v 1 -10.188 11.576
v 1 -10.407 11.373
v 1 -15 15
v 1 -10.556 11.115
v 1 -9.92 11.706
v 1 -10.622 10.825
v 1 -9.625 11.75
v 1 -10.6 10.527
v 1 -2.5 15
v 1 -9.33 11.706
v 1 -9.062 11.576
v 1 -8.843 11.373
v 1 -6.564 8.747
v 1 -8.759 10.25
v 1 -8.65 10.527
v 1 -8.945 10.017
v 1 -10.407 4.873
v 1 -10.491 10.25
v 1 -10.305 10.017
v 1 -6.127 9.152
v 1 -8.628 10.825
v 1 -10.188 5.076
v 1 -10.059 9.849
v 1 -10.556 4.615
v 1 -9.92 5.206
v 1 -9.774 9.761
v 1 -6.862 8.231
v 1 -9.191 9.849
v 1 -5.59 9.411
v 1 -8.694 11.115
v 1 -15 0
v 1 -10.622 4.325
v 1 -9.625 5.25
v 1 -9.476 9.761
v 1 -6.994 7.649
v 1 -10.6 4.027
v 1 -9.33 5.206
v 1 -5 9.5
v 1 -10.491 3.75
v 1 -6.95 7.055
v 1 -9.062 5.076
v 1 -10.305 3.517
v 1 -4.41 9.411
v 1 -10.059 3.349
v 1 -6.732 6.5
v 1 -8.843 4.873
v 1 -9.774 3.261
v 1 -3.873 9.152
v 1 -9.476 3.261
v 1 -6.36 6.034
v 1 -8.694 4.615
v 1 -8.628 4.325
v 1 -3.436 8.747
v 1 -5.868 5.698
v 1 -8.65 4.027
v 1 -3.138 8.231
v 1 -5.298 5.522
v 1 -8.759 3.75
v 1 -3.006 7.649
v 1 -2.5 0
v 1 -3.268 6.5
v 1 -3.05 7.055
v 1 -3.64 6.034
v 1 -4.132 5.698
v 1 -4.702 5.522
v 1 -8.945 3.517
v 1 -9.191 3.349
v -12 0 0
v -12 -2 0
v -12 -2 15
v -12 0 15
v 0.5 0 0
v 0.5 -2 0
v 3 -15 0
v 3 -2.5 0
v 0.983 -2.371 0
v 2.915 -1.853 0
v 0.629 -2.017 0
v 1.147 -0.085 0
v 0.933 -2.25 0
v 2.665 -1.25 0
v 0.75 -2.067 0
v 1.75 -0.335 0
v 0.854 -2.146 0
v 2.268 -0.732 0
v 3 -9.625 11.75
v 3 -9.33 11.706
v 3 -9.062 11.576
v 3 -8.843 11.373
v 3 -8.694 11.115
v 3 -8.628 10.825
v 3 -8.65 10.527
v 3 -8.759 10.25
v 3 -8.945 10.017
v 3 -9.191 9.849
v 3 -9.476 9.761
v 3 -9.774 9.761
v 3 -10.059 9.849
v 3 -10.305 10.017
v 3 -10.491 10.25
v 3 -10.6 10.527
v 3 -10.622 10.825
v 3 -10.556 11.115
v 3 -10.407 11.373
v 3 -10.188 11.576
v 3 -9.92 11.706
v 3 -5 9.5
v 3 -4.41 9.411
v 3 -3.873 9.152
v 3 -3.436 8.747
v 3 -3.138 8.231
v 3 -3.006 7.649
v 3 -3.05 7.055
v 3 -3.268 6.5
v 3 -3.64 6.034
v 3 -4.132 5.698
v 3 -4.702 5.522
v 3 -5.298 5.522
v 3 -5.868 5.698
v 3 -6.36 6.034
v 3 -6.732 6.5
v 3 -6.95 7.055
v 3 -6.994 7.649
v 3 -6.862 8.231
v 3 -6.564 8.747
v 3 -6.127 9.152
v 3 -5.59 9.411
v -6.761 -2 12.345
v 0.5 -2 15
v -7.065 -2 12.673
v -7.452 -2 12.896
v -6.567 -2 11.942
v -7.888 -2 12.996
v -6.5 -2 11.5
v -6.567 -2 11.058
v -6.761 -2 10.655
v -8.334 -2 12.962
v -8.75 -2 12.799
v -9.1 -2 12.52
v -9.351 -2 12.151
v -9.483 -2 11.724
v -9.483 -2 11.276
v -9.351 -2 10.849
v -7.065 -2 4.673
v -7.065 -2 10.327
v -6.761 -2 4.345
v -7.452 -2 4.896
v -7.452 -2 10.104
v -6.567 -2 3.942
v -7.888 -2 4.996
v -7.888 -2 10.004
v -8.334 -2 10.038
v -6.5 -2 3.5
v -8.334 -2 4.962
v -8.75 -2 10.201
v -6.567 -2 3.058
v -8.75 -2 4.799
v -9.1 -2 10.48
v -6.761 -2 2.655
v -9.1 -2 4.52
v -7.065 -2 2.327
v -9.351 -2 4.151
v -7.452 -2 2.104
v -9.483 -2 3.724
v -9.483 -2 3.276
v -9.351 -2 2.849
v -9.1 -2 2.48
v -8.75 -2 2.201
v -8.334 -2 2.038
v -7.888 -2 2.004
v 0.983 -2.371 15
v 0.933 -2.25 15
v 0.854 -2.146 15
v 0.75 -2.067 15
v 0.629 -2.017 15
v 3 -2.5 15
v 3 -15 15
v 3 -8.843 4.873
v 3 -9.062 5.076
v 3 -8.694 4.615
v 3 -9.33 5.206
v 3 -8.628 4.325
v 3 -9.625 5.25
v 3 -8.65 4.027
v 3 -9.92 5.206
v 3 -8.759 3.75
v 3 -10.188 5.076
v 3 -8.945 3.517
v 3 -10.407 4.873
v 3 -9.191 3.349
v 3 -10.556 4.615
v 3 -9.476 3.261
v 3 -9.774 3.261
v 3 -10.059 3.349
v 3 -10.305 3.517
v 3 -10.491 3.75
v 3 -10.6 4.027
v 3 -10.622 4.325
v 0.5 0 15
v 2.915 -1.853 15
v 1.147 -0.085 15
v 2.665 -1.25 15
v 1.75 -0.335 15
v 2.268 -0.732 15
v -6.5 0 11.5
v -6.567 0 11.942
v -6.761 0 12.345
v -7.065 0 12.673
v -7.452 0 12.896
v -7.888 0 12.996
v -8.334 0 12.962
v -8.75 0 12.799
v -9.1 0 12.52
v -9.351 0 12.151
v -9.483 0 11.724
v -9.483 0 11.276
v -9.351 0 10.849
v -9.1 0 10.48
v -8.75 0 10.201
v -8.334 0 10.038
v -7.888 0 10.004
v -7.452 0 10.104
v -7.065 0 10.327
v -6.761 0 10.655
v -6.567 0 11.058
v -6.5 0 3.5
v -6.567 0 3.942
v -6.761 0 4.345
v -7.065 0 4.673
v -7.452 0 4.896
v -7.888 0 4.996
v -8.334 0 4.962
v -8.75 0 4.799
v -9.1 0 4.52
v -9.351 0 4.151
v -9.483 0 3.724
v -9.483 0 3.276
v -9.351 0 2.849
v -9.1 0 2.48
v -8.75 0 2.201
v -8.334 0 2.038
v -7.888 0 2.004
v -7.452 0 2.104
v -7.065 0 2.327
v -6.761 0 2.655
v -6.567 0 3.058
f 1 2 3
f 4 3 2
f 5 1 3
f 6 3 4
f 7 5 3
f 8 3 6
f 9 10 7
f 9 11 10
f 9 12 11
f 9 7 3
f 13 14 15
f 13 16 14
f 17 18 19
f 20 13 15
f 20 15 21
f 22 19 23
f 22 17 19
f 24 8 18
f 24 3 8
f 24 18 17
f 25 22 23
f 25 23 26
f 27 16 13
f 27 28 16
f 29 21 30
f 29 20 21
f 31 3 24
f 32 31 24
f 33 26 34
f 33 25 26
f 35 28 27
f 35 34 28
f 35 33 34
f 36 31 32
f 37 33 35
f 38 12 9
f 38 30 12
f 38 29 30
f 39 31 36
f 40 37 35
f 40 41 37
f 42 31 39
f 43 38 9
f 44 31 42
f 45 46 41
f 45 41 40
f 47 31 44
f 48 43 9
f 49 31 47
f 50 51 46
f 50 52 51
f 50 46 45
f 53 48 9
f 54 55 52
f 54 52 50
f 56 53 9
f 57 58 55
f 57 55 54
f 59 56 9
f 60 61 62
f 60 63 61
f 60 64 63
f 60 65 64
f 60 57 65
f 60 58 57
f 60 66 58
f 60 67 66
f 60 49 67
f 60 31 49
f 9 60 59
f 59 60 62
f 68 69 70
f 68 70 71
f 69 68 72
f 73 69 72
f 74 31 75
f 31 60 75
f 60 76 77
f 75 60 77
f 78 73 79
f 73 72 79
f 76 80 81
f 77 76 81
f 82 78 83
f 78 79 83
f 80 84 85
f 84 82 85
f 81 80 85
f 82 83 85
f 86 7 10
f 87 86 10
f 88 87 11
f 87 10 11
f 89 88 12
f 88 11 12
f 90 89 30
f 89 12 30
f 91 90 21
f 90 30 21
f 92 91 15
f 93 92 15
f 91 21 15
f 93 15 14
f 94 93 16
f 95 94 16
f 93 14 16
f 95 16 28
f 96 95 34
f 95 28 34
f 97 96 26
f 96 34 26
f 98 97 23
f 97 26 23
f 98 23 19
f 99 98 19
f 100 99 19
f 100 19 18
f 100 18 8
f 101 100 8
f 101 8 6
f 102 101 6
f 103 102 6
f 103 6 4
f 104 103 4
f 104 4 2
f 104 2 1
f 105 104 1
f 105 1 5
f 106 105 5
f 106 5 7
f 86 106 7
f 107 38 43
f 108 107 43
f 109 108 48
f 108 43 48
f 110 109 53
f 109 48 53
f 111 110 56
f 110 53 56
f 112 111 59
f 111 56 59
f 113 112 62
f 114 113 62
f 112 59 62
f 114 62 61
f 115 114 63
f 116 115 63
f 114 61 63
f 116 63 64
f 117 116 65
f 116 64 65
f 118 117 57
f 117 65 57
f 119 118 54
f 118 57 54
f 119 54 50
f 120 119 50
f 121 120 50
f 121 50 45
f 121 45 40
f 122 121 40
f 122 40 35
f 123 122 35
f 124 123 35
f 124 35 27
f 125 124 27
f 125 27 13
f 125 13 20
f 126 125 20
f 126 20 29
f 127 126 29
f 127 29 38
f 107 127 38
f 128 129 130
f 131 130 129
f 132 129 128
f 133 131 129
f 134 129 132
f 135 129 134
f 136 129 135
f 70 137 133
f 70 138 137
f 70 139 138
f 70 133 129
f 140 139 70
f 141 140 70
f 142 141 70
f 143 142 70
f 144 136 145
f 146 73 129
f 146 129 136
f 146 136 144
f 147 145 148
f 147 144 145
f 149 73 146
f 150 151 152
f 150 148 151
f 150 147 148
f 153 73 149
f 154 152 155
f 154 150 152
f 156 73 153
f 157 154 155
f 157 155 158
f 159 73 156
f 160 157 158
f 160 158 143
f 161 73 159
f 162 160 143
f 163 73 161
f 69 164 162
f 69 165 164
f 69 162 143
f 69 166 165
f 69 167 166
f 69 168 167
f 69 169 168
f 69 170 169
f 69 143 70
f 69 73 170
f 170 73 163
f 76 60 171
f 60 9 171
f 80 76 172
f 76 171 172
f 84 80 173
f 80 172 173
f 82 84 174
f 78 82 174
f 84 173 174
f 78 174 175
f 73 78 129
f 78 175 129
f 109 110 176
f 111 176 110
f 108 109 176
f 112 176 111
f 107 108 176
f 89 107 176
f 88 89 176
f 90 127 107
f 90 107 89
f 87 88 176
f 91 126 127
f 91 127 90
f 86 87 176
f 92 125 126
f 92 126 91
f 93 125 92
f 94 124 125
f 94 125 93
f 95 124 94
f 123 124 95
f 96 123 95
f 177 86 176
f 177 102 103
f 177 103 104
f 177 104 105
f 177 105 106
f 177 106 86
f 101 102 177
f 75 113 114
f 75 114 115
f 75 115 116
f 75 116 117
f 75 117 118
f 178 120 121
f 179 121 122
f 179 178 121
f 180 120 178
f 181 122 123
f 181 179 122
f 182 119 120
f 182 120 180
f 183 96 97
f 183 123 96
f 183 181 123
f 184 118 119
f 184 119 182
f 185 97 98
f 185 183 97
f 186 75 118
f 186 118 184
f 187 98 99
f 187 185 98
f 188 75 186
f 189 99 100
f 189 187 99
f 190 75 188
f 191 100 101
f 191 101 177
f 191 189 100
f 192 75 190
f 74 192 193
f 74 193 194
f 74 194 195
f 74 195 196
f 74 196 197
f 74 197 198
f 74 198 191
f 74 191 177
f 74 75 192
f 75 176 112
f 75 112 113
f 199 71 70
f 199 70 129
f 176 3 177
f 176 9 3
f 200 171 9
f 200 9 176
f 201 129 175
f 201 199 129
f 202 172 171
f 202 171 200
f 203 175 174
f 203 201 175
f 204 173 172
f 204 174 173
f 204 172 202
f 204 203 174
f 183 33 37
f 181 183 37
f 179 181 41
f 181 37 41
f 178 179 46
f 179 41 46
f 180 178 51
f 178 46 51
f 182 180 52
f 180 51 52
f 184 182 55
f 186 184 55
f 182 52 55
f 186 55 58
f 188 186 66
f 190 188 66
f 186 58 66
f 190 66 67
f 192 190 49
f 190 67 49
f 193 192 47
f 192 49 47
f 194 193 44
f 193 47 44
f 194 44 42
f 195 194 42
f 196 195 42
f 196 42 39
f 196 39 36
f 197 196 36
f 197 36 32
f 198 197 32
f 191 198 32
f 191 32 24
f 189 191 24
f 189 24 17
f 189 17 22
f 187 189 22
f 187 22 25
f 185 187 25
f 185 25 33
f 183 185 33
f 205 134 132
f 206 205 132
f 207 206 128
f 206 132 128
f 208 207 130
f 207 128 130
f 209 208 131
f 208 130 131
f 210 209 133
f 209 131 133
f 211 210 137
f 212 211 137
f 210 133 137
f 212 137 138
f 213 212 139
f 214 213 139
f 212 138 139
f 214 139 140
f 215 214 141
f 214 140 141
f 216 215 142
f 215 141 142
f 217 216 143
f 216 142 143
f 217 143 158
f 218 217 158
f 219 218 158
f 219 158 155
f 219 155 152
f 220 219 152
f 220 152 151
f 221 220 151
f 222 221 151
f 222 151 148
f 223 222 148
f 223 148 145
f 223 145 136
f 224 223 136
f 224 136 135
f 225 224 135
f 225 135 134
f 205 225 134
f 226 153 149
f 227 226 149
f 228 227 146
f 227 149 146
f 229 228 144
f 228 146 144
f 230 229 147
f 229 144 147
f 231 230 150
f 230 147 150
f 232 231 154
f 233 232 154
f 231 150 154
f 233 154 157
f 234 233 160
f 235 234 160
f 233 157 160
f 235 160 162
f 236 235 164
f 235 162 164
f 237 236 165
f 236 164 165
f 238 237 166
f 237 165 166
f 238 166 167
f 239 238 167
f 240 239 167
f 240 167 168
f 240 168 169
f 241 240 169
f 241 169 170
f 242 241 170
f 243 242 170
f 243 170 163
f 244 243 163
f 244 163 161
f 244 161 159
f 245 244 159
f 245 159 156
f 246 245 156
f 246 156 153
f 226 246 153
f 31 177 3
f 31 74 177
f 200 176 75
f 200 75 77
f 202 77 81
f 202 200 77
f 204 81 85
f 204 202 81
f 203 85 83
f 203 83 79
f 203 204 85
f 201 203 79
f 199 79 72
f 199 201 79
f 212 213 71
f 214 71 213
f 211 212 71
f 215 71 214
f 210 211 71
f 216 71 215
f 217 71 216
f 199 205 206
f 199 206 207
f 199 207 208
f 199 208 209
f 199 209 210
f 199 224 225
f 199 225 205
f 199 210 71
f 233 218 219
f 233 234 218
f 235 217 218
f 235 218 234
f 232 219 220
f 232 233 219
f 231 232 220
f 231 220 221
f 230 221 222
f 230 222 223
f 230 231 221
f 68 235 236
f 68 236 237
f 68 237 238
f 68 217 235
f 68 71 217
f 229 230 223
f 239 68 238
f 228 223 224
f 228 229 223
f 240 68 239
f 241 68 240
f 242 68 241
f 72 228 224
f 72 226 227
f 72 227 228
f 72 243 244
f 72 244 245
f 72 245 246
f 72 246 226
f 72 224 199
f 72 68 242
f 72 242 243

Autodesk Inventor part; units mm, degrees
ref_plane "YZ Plane" through (0, 0, 0) normal (1, 0, 0) x (0, 1, 0)
ref_plane "XZ Plane" through (0, 0, 0) normal (0, 1, 0) x (-1, 0, 0)
ref_plane "XY Plane" through (0, 0, 0) normal (0, 0, 1) x (1, 0, 0)
sketch "Sketch1" plane through (0, 0, 0) normal (0, 0, 1) x (1, 0, 0)
  line L0 (3, 0) -> (3, -15)
  line L1 (3, -15) -> (1, -15)
  line L2 (1, -15) -> (1, -2)
  line L3 (1, -2) -> (-12, -2)
  line L4 (-12, -2) -> (-12, 0)
  line L5 (-12, 0) -> (3, 0)
  line L6 (-12, 0) -> (3, 0)
  dimension "d38" = 2
  dimension "d39" = 13
  dimension "d40" = 13
  dimension "d41" = 2
extrude "Extrusion3" add sketch "Sketch1" along normal blind 15
sketch "Sketch2" plane through (-12, -2, 0) normal (0, -1, 0) x (1, 0, 0)
  circle A0 centre (4, 3.5) radius 1.5
  line L0 (0, 15) -> (13, 15) projected
  line L1 (0, 0) -> (0, 15) projected
  line L2 (0, 0) -> (13, 0) projected
  circle A1 centre (4, 11.5) radius 1.5
  dimension "d45" = 3
  dimension "d47" = 4
  dimension "d48" = 3.5
  dimension "d49" = 3
  dimension "d50" = 4
  dimension "d51" = 3.5
extrude "Extrusion4" cut sketch "Sketch2" against normal blind 10
sketch "Sketch3" plane through (1, -15, 0) normal (-1, 0, 0) x (0, 0, 1)
  circle A0 centre (10.75, 5.375) radius 1
  circle A1 centre (4.25, 5.375) radius 1
  line L0 (0, 0) -> (15, 0) projected
  line L1 (15, 13) -> (15, 0) projected
  line L2 (0, 13) -> (0, 0) projected
  circle A2 centre (7.5, 10) radius 2
  dimension "d54" = 2
  dimension "d55" = 2
  dimension "d56" = 5.375
  dimension "d57" = 5.375
  dimension "d58" = 4.25
  dimension "d59" = 4.25
  dimension "d62" = 4
  dimension "d65" = 10
extrude "Extrusion5" cut sketch "Sketch3" against normal blind 10 contours A0 | A1
extrude "Extrusion6" cut sketch "Sketch3" against normal blind 10 contours A2
fillet "Fillet1" radius 2.5 1 edges at (3, 0, 7.5)
fillet "Fillet2" radius 0.5 1 edges at (1, -2, 7.5)
equation "\"d51\" = d48"
equation "\"d58\" = d59"
properties part number "Soporte de Final de Carrera - Eje X" material "Aluminum 1100-H14"
